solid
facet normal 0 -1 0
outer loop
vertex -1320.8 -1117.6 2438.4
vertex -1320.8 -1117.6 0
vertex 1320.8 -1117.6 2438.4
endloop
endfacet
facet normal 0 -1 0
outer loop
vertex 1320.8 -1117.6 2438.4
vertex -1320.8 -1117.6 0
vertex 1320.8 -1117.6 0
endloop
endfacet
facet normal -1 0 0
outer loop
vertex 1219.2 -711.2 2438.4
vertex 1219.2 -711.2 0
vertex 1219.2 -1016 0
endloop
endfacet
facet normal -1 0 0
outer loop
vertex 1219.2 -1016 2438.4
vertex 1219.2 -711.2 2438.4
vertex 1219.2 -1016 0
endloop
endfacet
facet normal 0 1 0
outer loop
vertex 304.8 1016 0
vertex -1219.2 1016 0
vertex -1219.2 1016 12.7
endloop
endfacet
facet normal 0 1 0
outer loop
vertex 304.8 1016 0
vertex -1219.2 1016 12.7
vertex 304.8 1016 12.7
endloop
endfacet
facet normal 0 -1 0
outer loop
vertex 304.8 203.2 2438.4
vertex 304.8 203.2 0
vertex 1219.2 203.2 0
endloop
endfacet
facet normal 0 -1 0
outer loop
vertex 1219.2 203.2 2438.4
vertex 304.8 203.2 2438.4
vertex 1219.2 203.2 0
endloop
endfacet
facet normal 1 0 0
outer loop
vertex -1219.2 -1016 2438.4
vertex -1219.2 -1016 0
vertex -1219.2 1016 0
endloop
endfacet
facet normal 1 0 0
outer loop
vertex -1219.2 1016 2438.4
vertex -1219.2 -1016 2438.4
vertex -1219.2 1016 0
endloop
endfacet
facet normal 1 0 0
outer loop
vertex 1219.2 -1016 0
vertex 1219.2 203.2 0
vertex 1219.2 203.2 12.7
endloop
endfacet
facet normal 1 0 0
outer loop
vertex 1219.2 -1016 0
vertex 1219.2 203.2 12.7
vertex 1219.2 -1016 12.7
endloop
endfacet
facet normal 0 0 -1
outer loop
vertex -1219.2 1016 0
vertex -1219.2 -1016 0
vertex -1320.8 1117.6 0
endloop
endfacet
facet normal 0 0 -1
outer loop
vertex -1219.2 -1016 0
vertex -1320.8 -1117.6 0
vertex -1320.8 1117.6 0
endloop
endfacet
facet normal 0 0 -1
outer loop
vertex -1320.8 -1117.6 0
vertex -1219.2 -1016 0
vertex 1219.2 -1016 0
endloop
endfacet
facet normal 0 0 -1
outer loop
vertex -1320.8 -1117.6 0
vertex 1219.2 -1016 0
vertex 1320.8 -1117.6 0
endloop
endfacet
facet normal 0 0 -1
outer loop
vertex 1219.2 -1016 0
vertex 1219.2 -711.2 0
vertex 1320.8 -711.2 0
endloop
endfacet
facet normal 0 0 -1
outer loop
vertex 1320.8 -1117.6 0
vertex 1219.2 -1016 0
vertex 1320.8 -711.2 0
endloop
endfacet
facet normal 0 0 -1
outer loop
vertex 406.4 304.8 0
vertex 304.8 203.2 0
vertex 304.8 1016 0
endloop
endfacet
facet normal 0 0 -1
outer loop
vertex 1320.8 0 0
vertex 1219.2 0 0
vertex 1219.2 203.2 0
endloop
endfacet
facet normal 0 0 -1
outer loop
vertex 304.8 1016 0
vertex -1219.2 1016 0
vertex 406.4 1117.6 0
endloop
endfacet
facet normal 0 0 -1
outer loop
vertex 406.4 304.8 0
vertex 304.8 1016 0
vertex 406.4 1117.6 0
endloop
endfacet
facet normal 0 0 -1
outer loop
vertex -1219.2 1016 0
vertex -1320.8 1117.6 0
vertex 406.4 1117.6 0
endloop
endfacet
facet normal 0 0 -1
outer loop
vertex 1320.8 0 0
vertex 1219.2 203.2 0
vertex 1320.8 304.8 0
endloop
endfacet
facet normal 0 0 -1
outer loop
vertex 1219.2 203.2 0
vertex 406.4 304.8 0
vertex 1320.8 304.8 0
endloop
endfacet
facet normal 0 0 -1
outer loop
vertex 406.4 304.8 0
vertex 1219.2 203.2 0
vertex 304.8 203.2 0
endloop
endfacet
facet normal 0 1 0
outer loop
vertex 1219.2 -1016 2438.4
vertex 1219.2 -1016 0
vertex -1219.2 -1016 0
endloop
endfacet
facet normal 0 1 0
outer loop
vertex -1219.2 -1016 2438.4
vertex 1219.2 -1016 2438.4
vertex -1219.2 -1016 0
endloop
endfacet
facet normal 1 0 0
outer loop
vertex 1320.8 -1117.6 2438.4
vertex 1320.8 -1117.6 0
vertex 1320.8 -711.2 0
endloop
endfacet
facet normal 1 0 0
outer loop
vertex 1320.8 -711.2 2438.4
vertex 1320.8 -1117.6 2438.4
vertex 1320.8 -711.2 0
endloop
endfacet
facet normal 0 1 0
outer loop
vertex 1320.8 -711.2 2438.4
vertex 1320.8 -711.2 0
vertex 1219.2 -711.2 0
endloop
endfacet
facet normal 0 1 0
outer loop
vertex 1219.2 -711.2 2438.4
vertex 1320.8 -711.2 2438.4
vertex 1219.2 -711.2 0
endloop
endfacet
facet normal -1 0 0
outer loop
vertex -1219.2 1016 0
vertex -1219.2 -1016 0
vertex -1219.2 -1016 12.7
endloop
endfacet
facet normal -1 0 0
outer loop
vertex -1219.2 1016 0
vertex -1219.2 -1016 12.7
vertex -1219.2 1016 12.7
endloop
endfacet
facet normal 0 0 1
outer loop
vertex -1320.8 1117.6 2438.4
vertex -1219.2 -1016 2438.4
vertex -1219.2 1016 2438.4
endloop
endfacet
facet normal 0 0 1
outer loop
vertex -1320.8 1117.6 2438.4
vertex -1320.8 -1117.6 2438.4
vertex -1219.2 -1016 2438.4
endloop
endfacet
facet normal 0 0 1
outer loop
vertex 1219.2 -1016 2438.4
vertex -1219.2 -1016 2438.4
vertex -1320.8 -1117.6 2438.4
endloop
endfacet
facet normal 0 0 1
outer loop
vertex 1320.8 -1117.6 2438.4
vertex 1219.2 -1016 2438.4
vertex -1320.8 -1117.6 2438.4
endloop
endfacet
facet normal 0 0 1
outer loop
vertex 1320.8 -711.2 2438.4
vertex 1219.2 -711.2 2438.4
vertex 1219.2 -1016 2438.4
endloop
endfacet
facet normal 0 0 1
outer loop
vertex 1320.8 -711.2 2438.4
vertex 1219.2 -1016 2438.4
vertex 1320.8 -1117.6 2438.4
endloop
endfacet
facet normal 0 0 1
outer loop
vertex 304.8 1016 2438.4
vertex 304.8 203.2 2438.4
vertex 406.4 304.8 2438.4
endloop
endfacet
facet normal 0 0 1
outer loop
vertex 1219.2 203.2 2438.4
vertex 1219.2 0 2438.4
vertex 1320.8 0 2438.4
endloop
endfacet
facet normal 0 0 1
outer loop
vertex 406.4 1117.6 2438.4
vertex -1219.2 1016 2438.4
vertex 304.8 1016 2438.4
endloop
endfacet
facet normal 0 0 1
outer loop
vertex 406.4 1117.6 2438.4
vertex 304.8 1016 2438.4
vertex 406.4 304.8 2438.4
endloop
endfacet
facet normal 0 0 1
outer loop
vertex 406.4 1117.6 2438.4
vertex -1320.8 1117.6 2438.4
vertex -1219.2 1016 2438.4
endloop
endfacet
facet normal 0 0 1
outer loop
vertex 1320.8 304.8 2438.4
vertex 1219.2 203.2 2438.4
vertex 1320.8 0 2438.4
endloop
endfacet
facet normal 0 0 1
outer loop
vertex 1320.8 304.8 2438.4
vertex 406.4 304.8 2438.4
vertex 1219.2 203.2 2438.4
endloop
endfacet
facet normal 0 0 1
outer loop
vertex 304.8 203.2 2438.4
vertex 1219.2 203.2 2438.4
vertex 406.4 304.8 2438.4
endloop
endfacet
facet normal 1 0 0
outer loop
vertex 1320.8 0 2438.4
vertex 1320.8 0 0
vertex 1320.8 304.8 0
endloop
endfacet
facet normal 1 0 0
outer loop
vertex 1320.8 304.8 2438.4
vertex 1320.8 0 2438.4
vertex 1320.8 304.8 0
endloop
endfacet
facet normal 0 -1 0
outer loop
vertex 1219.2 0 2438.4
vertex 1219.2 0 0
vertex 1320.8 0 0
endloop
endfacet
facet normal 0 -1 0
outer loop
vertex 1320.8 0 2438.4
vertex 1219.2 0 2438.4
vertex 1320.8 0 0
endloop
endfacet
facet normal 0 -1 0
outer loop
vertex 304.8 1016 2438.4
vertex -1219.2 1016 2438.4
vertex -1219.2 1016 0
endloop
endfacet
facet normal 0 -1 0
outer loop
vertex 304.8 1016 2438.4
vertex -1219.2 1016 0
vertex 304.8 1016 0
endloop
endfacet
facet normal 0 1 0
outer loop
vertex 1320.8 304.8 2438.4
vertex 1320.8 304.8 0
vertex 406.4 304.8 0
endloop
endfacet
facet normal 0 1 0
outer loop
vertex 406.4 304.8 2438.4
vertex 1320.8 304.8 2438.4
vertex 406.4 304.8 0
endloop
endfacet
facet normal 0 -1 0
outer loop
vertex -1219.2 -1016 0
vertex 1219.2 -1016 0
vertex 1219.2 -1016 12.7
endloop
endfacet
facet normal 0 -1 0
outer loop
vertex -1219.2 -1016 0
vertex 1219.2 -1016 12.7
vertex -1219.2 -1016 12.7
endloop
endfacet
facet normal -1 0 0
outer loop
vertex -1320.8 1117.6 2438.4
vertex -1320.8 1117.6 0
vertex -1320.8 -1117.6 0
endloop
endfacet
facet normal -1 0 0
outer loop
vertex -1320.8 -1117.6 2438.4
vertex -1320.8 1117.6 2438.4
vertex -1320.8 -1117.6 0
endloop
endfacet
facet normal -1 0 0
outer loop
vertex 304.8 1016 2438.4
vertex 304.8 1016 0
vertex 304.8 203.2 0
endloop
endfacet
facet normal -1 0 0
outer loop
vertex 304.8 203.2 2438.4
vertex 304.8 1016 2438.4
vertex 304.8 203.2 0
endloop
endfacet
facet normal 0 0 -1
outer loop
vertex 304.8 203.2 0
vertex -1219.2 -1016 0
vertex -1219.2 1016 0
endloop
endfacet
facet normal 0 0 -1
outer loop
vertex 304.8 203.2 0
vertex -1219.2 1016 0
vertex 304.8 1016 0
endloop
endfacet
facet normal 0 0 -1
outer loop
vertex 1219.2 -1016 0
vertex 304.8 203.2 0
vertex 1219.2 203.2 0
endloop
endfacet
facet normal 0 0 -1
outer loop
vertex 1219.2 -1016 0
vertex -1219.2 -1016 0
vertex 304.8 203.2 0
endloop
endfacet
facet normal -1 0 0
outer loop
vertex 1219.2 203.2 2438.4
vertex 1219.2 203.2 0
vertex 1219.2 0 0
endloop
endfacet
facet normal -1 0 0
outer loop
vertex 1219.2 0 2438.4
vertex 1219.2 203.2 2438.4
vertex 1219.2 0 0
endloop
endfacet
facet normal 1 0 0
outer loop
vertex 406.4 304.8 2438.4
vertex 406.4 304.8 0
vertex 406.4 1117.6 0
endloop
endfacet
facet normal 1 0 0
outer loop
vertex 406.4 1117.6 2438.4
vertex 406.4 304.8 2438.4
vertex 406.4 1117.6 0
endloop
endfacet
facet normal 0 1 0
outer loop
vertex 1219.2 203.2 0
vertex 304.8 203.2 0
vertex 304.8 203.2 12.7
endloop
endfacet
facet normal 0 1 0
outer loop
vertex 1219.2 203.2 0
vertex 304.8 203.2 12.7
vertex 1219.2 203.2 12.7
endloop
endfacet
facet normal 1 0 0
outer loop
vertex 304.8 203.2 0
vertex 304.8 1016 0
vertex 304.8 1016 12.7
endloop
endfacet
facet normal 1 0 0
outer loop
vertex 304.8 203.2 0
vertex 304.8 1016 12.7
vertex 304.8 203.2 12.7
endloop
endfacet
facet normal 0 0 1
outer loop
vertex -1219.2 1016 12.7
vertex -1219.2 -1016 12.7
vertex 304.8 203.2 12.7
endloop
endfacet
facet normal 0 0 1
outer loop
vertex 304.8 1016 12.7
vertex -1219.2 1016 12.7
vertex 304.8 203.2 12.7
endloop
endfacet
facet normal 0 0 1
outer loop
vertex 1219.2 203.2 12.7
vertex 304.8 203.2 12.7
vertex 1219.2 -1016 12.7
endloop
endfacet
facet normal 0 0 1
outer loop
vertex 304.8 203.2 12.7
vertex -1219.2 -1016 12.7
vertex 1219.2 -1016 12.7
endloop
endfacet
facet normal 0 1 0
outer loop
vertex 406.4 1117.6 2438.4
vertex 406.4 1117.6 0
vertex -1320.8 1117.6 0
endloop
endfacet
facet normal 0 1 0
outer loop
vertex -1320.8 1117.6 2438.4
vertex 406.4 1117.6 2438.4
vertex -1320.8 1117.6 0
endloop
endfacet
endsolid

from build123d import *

# Parameters (mm, degrees)
F1_DEPTH = 2438.4
F3_DEPTH = 12.7


with BuildPart() as f1:
    # F0 (on Top) → F1 (new body)
    with BuildSketch(Plane.XY):
        Polygon((1219.2, -711.2), (1219.2, -1016), (-1219.2, -1016), (-1219.2, 1016), (304.8, 1016), (304.8, 203.2), (1219.2, 203.2), (1219.2, 0), (1320.8, 0), (1320.8, 304.8), (406.4, 304.8), (406.4, 1117.6), (-1320.8, 1117.6), (-1320.8, -1117.6), (1320.8, -1117.6), (1320.8, -711.2), align=None)
    extrude(amount=F1_DEPTH)


with BuildPart() as f3:
    # F2 (on face) → F3 (new body)
    with BuildSketch(Plane(origin=(0, 0, 0), x_dir=(1, 0, 0), z_dir=(0, 0, -1))):
        Polygon((1219.2, 711.2), (1219.2, 1016), (-1219.2, 1016), (-1219.2, -1016), (304.8, -1016), (304.8, -203.2), (1219.2, -203.2), (1219.2, 0), align=None)
    extrude(amount=-F3_DEPTH)


solid = Compound([f1.part, f3.part])
